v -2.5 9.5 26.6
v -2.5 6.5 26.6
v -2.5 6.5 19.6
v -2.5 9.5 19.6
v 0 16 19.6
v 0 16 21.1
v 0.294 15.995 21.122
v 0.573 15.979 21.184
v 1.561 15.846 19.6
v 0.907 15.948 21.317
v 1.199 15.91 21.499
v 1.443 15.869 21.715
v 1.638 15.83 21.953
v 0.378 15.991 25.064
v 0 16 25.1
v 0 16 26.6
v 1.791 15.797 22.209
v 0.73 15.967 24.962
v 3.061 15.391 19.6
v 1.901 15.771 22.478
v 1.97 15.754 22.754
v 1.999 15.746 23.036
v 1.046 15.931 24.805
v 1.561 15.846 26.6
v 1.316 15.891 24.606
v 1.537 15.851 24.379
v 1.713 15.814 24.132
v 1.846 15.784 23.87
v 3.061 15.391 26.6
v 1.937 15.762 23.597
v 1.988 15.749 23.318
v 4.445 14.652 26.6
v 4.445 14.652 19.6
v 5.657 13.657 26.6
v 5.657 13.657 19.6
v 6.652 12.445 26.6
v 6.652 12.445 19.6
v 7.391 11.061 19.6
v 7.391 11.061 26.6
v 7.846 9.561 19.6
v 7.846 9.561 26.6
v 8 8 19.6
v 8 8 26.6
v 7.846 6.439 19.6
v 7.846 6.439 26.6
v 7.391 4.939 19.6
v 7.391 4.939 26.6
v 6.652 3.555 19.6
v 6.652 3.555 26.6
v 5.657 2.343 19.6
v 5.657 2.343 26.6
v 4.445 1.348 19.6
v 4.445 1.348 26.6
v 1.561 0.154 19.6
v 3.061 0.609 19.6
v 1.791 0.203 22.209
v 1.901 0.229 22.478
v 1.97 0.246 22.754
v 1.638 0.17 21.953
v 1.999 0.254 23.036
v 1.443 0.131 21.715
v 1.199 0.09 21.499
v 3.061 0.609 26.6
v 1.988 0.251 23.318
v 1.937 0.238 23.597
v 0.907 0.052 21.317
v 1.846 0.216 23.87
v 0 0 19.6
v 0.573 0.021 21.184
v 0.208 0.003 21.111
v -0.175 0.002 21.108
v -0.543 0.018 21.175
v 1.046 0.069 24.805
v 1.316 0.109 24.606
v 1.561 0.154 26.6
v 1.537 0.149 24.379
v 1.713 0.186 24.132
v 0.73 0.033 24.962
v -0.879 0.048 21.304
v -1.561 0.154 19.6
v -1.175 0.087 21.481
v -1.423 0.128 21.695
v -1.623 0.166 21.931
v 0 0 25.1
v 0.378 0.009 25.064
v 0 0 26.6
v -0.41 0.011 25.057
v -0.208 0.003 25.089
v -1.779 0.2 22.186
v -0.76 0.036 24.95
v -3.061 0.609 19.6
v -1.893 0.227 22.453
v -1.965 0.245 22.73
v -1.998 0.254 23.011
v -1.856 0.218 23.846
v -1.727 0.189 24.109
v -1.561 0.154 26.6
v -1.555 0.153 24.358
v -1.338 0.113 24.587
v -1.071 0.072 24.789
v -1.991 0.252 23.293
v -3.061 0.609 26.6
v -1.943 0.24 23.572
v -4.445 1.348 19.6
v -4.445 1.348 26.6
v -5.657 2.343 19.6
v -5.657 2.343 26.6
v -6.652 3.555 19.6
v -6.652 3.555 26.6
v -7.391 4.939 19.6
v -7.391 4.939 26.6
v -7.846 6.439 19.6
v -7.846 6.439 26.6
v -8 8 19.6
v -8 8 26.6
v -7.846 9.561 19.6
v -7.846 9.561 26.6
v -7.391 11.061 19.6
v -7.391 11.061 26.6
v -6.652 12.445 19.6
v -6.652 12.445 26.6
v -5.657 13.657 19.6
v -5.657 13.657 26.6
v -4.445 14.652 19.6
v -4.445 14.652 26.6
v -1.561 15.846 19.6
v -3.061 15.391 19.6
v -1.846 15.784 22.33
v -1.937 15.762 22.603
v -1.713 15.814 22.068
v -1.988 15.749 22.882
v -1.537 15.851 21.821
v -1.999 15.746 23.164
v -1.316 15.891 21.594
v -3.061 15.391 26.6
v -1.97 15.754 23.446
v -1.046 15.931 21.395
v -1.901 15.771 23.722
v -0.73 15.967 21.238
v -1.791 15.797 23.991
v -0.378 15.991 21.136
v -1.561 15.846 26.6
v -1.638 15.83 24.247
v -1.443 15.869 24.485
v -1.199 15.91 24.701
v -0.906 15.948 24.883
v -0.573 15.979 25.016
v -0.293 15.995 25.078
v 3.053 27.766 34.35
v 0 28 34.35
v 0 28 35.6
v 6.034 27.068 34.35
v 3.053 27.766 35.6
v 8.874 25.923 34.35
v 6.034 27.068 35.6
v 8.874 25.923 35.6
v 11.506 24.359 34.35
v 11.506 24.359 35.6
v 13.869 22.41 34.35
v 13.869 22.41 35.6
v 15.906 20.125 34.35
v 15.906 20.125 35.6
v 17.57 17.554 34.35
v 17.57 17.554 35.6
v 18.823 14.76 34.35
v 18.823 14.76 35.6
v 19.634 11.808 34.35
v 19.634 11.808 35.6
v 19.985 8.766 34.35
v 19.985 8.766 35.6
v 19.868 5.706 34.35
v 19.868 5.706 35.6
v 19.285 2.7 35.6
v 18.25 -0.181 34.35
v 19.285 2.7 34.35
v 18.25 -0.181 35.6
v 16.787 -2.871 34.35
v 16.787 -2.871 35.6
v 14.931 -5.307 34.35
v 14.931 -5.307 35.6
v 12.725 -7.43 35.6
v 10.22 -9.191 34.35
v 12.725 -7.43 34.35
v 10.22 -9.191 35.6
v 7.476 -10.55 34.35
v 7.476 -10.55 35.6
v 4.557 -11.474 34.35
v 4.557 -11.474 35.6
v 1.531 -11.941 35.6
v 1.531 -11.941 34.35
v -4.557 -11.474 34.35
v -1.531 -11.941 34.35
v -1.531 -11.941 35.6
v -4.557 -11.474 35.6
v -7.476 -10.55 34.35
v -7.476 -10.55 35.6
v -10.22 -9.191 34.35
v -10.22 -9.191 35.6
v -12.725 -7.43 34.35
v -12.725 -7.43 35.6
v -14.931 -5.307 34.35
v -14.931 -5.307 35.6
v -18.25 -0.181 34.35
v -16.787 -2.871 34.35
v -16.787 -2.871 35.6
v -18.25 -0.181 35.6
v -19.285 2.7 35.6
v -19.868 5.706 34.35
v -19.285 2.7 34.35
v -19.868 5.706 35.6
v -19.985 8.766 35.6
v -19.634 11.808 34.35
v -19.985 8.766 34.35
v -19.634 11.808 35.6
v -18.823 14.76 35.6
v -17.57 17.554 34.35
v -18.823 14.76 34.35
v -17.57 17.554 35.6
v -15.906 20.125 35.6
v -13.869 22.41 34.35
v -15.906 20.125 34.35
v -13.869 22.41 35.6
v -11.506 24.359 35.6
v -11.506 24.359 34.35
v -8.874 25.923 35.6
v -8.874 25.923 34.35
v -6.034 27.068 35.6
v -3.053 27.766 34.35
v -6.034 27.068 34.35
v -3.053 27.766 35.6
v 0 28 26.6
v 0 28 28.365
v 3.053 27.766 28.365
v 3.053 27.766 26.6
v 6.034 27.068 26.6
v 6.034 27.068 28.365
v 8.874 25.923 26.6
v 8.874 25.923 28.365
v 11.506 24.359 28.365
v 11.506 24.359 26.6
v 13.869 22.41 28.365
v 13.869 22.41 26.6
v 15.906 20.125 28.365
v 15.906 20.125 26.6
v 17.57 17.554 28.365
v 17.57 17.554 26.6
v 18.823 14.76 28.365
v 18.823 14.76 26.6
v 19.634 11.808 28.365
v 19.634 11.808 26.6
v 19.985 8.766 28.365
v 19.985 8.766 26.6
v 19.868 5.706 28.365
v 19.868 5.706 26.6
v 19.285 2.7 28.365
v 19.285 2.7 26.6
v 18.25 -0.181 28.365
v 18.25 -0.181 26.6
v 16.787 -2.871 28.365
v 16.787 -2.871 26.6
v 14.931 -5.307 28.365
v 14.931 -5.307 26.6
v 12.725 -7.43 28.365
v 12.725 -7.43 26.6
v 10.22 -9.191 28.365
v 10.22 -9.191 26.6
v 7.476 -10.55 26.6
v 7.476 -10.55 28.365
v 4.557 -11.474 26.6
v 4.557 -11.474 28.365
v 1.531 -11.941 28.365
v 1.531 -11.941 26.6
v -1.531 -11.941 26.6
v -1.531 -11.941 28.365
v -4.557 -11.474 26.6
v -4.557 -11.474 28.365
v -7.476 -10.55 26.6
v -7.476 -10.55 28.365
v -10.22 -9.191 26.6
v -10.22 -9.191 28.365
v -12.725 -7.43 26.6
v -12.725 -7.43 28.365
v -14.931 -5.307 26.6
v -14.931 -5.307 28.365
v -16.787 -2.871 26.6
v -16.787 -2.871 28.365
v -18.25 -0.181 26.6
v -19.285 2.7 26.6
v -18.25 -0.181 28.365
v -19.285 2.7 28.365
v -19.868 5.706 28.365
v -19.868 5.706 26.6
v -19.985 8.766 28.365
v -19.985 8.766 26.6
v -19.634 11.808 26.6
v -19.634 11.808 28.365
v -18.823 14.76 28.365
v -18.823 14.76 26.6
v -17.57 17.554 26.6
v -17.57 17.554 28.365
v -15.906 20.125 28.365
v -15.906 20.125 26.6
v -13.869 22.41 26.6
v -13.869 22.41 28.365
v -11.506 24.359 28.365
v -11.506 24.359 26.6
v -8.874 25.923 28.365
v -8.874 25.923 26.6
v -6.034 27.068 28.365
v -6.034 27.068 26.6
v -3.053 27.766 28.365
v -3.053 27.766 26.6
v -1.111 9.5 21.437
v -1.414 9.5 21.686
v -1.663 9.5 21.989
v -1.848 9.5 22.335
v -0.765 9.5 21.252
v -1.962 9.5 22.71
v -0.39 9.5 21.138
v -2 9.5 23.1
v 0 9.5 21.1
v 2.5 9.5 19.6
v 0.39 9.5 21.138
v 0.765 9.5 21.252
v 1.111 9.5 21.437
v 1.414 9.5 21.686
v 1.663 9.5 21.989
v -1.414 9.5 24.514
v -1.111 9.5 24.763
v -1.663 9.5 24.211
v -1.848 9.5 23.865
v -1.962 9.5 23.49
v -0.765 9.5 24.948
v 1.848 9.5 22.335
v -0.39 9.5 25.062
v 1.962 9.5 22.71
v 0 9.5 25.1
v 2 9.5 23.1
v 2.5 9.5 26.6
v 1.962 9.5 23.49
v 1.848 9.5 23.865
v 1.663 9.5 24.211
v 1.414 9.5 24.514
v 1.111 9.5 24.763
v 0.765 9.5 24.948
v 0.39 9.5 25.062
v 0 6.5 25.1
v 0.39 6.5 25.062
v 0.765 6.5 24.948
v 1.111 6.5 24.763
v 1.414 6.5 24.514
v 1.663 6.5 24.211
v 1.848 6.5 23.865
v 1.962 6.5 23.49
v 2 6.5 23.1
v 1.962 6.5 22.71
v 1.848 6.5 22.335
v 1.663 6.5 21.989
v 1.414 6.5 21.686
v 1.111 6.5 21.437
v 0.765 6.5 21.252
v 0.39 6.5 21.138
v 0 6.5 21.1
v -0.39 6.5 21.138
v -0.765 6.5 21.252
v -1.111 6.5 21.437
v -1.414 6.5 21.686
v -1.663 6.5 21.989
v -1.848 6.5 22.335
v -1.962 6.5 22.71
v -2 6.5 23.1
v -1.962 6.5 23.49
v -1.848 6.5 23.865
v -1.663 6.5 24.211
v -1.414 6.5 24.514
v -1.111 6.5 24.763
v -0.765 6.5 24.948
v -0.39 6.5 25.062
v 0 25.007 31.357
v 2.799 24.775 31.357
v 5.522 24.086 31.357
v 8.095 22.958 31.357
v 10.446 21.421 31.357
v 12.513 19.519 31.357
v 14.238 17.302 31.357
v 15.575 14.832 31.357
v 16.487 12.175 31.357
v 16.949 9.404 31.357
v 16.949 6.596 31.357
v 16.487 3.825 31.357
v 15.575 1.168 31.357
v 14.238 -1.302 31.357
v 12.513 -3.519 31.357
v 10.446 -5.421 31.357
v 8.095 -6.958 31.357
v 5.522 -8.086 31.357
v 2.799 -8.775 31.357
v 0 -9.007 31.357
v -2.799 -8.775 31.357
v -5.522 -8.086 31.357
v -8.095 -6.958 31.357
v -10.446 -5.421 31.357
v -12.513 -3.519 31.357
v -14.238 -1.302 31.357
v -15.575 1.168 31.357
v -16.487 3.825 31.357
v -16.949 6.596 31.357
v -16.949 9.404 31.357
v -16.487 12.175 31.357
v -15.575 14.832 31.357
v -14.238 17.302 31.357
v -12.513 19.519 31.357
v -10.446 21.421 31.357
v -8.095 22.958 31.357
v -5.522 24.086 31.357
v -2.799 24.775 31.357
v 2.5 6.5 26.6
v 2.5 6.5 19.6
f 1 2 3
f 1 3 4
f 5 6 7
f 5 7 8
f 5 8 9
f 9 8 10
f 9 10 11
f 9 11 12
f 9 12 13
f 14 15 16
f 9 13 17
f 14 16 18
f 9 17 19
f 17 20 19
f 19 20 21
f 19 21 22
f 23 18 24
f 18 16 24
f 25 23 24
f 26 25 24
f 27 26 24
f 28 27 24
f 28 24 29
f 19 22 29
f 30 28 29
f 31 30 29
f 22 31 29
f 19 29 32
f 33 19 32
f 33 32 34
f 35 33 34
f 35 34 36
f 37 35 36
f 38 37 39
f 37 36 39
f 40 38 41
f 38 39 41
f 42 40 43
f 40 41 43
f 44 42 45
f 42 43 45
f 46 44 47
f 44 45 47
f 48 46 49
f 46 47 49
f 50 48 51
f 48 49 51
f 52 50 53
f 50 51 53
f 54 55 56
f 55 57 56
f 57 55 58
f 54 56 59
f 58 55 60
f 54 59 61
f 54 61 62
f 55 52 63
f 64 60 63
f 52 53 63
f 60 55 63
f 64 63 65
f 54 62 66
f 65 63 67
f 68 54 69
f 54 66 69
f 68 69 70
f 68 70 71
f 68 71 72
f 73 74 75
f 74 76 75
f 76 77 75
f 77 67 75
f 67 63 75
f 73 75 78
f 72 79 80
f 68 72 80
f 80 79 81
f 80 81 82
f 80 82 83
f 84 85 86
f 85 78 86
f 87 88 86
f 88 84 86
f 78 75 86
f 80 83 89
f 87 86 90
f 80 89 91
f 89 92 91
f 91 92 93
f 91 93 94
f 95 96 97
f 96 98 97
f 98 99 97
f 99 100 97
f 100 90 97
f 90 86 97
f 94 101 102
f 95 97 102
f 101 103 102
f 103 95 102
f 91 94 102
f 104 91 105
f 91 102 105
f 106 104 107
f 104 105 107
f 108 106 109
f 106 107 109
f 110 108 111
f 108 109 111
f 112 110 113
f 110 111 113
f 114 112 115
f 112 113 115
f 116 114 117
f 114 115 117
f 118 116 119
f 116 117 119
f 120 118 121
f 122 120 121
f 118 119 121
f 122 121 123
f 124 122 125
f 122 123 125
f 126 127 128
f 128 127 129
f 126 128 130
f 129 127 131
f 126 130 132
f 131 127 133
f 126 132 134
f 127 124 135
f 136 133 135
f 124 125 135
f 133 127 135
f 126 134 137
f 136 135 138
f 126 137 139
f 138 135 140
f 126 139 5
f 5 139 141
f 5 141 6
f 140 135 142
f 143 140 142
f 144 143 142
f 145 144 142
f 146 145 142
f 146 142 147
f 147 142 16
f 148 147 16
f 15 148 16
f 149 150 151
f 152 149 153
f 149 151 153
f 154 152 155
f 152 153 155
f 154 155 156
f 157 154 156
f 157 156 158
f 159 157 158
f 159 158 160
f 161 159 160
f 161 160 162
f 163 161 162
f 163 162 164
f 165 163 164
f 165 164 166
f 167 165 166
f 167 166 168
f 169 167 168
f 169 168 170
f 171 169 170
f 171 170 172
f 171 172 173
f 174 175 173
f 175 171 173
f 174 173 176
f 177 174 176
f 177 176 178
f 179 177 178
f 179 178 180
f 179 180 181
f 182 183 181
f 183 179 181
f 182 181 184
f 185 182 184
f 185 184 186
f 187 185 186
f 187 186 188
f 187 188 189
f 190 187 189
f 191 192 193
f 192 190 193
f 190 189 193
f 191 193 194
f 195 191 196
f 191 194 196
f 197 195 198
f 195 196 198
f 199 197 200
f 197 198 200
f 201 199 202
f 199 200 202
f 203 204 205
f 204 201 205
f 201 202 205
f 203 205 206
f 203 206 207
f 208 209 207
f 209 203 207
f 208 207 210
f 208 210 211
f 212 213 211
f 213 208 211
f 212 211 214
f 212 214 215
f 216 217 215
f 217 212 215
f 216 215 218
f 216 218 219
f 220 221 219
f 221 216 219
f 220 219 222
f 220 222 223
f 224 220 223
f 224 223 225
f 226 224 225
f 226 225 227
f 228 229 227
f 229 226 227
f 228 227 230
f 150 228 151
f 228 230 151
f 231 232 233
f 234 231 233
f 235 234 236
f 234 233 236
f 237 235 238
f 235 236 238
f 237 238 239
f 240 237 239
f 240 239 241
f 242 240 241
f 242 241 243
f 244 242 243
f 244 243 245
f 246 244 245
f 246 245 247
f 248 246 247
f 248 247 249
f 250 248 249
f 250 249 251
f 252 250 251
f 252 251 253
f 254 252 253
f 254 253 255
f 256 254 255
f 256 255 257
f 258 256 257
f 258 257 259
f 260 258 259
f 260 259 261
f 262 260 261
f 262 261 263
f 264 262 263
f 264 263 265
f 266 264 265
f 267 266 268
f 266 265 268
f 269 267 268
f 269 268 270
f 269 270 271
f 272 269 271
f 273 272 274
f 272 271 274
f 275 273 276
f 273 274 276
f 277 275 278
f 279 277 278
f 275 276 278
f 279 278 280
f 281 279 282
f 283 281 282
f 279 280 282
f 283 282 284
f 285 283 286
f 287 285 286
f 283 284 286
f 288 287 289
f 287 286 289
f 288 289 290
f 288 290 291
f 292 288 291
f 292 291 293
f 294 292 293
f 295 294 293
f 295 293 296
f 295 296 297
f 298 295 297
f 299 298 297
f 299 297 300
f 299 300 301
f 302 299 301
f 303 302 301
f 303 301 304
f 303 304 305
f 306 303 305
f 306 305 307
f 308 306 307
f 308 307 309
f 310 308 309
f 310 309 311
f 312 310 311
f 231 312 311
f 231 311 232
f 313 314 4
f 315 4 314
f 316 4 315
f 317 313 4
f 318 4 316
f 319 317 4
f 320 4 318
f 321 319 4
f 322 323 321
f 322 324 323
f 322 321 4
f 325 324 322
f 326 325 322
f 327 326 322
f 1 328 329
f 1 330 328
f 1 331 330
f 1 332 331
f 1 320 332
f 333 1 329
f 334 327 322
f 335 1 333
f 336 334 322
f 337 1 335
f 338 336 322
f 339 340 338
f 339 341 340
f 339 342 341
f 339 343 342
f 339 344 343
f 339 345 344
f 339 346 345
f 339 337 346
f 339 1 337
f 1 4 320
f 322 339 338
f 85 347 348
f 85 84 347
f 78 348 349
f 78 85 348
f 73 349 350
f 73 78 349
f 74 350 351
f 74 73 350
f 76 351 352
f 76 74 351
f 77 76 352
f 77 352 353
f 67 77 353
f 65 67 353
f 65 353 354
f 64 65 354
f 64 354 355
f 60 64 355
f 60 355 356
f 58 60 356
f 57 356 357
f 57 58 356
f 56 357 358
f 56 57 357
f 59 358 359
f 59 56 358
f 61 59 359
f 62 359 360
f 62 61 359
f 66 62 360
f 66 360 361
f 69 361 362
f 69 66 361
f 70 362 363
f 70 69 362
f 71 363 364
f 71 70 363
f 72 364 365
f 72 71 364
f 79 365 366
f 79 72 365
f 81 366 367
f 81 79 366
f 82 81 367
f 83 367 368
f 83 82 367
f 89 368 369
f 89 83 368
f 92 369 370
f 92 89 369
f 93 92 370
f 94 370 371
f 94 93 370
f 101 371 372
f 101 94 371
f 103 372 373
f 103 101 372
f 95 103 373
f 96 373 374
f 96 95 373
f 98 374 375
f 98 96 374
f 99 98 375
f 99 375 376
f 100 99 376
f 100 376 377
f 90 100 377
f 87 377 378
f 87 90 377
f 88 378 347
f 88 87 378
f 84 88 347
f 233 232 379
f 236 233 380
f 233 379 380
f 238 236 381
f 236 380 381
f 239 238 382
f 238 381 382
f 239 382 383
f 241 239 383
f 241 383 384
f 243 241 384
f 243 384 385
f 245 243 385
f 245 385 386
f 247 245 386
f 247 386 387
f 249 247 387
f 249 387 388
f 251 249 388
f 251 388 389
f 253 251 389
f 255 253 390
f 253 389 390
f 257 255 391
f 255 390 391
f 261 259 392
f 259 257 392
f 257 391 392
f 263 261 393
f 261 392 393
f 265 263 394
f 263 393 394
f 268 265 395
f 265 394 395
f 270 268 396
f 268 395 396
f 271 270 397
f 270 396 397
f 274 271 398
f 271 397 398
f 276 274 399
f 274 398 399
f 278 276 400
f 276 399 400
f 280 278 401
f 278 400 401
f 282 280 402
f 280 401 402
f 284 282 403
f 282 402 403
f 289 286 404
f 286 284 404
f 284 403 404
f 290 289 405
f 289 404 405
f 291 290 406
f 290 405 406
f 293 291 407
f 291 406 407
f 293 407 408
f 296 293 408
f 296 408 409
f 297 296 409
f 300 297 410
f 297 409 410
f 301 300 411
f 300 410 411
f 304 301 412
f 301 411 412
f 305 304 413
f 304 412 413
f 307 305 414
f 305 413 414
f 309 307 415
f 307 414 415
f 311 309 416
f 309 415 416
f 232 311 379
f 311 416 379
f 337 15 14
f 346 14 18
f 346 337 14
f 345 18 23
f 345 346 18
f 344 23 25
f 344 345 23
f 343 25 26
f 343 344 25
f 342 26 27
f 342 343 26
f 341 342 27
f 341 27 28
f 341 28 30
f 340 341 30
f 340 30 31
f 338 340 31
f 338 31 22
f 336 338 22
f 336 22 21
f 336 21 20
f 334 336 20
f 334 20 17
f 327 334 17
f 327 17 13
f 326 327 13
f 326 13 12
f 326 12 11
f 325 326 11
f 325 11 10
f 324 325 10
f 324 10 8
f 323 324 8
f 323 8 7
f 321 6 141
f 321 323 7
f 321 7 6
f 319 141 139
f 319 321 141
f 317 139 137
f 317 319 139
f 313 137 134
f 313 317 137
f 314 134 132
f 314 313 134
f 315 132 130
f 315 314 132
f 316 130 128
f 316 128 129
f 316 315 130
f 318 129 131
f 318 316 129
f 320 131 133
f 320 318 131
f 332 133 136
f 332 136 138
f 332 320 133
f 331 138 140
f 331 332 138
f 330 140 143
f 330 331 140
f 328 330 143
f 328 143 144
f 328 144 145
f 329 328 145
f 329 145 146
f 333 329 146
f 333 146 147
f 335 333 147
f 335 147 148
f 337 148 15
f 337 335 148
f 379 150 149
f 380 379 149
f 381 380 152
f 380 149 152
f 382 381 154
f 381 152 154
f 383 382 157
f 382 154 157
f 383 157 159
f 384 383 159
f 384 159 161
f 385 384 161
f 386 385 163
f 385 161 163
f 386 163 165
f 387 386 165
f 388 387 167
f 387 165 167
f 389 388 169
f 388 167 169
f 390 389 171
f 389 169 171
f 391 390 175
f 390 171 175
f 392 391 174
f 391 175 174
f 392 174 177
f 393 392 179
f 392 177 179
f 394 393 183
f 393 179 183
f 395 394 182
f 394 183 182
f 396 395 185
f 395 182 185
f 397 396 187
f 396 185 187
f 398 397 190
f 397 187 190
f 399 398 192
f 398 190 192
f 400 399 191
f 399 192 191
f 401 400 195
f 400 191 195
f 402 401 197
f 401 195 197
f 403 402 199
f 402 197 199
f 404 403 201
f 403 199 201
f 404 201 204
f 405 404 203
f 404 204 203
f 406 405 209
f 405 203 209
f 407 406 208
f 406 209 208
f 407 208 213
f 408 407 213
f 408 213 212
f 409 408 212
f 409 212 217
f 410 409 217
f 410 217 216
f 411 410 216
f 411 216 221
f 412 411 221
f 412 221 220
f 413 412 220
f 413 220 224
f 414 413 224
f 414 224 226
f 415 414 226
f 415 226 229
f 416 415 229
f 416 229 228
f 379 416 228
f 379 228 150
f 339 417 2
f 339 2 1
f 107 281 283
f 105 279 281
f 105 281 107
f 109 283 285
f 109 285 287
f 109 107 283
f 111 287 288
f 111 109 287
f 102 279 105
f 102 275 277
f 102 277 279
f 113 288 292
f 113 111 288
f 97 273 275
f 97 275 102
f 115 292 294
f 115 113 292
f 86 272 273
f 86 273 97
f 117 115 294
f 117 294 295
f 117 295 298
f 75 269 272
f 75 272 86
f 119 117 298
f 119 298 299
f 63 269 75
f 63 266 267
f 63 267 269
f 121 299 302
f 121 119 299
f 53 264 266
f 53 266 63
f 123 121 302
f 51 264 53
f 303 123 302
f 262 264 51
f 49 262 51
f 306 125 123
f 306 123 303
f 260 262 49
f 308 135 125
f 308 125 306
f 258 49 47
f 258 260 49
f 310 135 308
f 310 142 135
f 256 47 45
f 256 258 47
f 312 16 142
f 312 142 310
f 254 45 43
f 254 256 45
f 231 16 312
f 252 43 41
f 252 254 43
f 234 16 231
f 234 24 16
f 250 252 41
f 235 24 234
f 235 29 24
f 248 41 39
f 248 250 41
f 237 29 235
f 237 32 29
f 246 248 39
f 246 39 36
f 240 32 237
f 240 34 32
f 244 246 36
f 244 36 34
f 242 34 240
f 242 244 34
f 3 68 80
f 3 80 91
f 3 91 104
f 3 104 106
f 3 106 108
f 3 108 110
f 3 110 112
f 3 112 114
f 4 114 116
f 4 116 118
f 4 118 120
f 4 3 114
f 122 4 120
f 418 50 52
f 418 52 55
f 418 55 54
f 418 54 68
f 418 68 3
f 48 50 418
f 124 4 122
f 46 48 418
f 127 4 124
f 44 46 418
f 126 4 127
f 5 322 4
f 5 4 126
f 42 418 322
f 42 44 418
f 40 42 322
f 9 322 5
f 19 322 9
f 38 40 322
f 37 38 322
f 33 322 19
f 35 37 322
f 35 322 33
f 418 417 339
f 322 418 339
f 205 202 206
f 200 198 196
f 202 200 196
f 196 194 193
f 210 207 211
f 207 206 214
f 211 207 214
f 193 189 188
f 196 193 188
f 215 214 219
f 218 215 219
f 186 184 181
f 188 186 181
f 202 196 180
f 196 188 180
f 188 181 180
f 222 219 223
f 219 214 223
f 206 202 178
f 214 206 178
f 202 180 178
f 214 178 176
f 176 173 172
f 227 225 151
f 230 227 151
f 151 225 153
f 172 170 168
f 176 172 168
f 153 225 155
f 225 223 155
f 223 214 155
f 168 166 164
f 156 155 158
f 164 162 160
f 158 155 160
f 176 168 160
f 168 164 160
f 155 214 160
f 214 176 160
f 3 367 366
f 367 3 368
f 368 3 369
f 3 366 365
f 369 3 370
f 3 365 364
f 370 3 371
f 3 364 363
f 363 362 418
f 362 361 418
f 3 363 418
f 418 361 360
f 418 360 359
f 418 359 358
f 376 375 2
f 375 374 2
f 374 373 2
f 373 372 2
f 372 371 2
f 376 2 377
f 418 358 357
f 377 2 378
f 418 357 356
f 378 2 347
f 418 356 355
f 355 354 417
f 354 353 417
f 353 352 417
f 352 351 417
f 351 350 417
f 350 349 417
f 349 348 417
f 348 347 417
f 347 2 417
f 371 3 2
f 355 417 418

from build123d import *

# Parameters (mm, degrees)
CYLINDER002_R                 = 2
CYLINDER002_DEPTH             = 30
CYLINDER002_PITCH_ANGLE       = 90
ROTATEEXTRUDE_ROLL_ANGLE      = 90
CYLINDER001_R                 = 20
CYLINDER001_DEPTH             = 9
CUBE_W                        = 3
CUBE_H                        = 5
CUBE_DEPTH                    = 16
CYLINDER_R                    = 8
CYLINDER_DEPTH                = 16
DIFFERENCE002_ROLL_ANGLE      = 180
DIFFERENCE002_PLACEMENT_ANGLE = 90


with BuildPart() as cylinder002:
    # cylinder002 → cylinder002 (new body)
    with BuildSketch(Plane.XY):
        Circle(CYLINDER002_R)
    extrude(amount=CYLINDER002_DEPTH)


with BuildPart() as cylinder002_1:
    # cylinder002 pitch: moved
    add(cylinder002.part.rotate(Axis((0, 0, 0), (0, 1, 0)), CYLINDER002_PITCH_ANGLE))


with BuildPart() as cylinder002_2:
    # cylinder002 placement: moved
    add(cylinder002_1.part.moved(Location((-15, 0, 12.5))))


with BuildPart() as rotateextrude:
    # RefineRotateExtrude → RotateExtrude (revolve)
    with BuildSketch(Plane(origin=(21.25, 4.242641, 0), x_dir=(0, 1, 0), z_dir=(0, 0, 1))):
        Polygon((0, 4.242641), (-4.242641, 0), (0, -4.242641), (4.242641, 0), align=None)
    revolve(axis=Axis((0, 0, 0), (0, 1, 0)))


with BuildPart() as rotateextrude_1:
    # RotateExtrude roll: moved
    add(rotateextrude.part.rotate(Axis((0, 0, 0), (1, 0, 0)), ROTATEEXTRUDE_ROLL_ANGLE))


with BuildPart() as rotateextrude_2:
    # RotateExtrude placement: moved
    add(rotateextrude_1.part)


with BuildPart() as cylinder001:
    # cylinder001 → cylinder001 (new body)
    with BuildSketch(Plane.XY):
        Circle(CYLINDER001_R)
    extrude(amount=CYLINDER001_DEPTH)


with BuildPart() as cube:
    # cube → cube (new body)
    with BuildSketch(Plane(origin=(-1.5, -2.5, 0), x_dir=(1, 0, 0), z_dir=(0, 0, 1))):
        with Locations((1.5, 2.5)):
            Rectangle(CUBE_W, CUBE_H)
    extrude(amount=CUBE_DEPTH)


with BuildPart() as krazek:
    # cylinder → cylinder (new body)
    with BuildSketch(Plane.XY):
        Circle(CYLINDER_R)
    extrude(amount=CYLINDER_DEPTH)

    # difference: cut cube
    add(cube.part, mode=Mode.SUBTRACT)

    # Group: union cylinder001
    add(cylinder001.part)

    # difference001: cut RotateExtrude
    add(rotateextrude_2.part, mode=Mode.SUBTRACT)

    # difference002: cut cylinder002
    add(cylinder002_2.part, mode=Mode.SUBTRACT)


with BuildPart() as krazek_1:
    # difference002 roll: moved
    add(krazek.part.rotate(Axis((0, 0, 0), (1, 0, 0)), DIFFERENCE002_ROLL_ANGLE))


with BuildPart() as krazek_2:
    # difference002 placement: moved
    add(krazek_1.part.moved(Location((0, 8, 35.6))).rotate(Axis((0, 8, 35.6), (0, 0, 1)), DIFFERENCE002_PLACEMENT_ANGLE))


solid = krazek_2.part
